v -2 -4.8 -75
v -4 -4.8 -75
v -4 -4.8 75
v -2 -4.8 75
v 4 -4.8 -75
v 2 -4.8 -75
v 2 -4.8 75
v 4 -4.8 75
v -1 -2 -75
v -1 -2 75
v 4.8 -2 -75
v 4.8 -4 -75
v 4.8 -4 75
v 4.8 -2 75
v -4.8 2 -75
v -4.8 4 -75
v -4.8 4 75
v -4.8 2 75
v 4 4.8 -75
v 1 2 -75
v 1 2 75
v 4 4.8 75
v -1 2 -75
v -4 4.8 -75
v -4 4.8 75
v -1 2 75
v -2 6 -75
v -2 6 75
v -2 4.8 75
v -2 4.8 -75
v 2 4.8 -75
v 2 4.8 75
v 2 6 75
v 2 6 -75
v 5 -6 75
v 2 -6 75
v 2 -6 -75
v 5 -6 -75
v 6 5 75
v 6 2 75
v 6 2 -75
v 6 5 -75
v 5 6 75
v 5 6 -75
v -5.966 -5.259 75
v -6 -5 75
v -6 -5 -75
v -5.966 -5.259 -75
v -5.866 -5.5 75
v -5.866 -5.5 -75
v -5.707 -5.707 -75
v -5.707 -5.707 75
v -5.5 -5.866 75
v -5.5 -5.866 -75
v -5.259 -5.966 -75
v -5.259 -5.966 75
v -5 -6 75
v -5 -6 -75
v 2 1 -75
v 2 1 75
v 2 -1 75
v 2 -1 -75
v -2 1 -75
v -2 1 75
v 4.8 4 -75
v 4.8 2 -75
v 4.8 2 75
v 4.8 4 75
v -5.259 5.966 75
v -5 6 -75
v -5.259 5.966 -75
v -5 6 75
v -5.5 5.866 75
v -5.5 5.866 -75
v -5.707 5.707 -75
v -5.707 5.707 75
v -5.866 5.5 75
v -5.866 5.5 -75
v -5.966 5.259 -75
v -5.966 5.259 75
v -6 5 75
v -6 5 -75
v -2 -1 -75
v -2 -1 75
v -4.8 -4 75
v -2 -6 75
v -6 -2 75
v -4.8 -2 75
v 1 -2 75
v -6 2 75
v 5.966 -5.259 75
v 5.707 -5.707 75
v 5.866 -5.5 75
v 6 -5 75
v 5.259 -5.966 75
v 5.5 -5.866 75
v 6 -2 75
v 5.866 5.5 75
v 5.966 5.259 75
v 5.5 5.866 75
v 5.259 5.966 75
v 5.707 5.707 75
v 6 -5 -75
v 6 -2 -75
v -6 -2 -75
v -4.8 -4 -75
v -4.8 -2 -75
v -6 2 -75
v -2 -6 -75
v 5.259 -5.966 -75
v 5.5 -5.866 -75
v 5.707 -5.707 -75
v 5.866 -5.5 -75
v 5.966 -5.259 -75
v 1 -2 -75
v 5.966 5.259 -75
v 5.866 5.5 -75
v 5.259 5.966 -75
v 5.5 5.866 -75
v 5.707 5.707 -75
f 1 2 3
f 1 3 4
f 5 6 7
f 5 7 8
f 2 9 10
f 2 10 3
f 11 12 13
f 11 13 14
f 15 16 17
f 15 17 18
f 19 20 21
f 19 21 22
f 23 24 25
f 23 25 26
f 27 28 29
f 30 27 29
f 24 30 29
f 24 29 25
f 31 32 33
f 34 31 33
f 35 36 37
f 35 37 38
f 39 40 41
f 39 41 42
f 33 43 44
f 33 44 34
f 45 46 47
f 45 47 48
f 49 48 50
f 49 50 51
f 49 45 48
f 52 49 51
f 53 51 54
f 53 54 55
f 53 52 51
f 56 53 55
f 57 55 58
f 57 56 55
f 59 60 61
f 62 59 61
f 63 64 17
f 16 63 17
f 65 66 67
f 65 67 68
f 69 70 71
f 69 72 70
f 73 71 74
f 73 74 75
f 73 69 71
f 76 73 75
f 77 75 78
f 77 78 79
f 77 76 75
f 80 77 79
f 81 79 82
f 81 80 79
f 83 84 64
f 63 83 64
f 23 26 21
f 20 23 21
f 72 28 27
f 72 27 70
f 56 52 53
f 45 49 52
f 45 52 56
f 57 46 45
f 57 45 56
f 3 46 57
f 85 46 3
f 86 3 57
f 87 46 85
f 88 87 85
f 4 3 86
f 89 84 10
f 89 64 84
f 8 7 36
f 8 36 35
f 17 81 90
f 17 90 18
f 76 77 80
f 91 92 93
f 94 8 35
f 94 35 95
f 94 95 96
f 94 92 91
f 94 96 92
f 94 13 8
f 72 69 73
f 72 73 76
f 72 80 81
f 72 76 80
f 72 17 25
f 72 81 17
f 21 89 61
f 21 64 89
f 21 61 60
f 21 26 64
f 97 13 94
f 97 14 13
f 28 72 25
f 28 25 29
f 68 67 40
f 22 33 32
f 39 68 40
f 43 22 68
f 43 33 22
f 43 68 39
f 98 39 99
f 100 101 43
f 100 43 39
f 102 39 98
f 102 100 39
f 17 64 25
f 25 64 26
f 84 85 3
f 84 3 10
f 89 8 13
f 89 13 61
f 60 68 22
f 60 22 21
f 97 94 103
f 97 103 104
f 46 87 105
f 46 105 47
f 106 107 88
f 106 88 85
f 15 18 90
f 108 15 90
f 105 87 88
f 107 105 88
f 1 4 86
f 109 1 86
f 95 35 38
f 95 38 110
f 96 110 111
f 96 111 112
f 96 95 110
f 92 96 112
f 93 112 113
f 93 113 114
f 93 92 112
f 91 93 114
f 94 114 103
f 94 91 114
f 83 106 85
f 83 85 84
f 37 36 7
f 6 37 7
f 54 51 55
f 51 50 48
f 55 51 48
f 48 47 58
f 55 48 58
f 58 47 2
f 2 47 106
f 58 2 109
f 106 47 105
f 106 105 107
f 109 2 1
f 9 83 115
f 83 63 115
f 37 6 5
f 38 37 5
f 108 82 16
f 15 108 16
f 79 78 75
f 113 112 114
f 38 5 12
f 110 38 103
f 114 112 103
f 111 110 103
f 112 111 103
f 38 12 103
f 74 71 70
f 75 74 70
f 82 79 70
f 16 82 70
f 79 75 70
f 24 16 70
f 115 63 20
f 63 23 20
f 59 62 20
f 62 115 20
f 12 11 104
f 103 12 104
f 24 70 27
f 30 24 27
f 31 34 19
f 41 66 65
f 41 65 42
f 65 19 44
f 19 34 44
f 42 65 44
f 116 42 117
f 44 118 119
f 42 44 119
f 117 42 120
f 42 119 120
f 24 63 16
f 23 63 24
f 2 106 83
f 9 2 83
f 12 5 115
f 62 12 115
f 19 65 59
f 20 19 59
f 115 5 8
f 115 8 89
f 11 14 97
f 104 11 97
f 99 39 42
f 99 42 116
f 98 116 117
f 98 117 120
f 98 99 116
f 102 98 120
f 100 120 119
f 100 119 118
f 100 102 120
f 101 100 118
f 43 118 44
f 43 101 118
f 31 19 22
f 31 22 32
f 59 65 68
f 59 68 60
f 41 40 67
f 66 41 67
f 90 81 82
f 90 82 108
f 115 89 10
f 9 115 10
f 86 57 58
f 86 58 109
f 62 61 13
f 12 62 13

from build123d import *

# Parameters (mm, degrees)
EXTRUSION1_DEPTH             = 75
ENL_V_MAT_EXTRU_1_DEPTH      = 151.239808307
R_P_TITION_CIRCULAIRE1_COUNT = 4


with BuildPart() as part:
    # Esquisse1 → Extrusion1 (new, symmetric)
    with BuildSketch(Plane.XY):
        with BuildLine():
            Line((-6, 5), (-6, -5))
            ThreePointArc((-6, -5), (-5.707106781, -5.707106781), (-5, -6))
            Line((-5, -6), (5, -6))
            ThreePointArc((5, -6), (5.707106781, -5.707106781), (6, -5))
            Line((6, -5), (6, 5))
            ThreePointArc((6, 5), (5.707106781, 5.707106781), (5, 6))
            Line((5, 6), (-5, 6))
            ThreePointArc((-5, 6), (-5.707106781, 5.707106781), (-6, 5))
        make_face()
    extrude(amount=EXTRUSION1_DEPTH, both=True)

    # Esquisse3 → Enlèv. mat.-Extru.1 (cut, through all)
    with BuildSketch(Plane.XY.offset(75)):
        Polygon((6, 2), (4.8, 2), (4.8, 4), (2, 1), (2, -1), (4.8, -4), (4.8, -2), (6, -2), align=None)
    enl_v_mat_extru_1 = extrude(amount=-ENL_V_MAT_EXTRU_1_DEPTH, mode=Mode.SUBTRACT)

    # Répétition circulaire1: Enlèv. mat.-Extru.1 ×4 about axis
    r_p_tition_circulaire1_axis = Axis((0, 0, -1), (0, 0, 1))
    for i in range(1, R_P_TITION_CIRCULAIRE1_COUNT):
        add(enl_v_mat_extru_1.rotate(r_p_tition_circulaire1_axis, i * 360 / R_P_TITION_CIRCULAIRE1_COUNT), mode=Mode.SUBTRACT)


solid = part.part
